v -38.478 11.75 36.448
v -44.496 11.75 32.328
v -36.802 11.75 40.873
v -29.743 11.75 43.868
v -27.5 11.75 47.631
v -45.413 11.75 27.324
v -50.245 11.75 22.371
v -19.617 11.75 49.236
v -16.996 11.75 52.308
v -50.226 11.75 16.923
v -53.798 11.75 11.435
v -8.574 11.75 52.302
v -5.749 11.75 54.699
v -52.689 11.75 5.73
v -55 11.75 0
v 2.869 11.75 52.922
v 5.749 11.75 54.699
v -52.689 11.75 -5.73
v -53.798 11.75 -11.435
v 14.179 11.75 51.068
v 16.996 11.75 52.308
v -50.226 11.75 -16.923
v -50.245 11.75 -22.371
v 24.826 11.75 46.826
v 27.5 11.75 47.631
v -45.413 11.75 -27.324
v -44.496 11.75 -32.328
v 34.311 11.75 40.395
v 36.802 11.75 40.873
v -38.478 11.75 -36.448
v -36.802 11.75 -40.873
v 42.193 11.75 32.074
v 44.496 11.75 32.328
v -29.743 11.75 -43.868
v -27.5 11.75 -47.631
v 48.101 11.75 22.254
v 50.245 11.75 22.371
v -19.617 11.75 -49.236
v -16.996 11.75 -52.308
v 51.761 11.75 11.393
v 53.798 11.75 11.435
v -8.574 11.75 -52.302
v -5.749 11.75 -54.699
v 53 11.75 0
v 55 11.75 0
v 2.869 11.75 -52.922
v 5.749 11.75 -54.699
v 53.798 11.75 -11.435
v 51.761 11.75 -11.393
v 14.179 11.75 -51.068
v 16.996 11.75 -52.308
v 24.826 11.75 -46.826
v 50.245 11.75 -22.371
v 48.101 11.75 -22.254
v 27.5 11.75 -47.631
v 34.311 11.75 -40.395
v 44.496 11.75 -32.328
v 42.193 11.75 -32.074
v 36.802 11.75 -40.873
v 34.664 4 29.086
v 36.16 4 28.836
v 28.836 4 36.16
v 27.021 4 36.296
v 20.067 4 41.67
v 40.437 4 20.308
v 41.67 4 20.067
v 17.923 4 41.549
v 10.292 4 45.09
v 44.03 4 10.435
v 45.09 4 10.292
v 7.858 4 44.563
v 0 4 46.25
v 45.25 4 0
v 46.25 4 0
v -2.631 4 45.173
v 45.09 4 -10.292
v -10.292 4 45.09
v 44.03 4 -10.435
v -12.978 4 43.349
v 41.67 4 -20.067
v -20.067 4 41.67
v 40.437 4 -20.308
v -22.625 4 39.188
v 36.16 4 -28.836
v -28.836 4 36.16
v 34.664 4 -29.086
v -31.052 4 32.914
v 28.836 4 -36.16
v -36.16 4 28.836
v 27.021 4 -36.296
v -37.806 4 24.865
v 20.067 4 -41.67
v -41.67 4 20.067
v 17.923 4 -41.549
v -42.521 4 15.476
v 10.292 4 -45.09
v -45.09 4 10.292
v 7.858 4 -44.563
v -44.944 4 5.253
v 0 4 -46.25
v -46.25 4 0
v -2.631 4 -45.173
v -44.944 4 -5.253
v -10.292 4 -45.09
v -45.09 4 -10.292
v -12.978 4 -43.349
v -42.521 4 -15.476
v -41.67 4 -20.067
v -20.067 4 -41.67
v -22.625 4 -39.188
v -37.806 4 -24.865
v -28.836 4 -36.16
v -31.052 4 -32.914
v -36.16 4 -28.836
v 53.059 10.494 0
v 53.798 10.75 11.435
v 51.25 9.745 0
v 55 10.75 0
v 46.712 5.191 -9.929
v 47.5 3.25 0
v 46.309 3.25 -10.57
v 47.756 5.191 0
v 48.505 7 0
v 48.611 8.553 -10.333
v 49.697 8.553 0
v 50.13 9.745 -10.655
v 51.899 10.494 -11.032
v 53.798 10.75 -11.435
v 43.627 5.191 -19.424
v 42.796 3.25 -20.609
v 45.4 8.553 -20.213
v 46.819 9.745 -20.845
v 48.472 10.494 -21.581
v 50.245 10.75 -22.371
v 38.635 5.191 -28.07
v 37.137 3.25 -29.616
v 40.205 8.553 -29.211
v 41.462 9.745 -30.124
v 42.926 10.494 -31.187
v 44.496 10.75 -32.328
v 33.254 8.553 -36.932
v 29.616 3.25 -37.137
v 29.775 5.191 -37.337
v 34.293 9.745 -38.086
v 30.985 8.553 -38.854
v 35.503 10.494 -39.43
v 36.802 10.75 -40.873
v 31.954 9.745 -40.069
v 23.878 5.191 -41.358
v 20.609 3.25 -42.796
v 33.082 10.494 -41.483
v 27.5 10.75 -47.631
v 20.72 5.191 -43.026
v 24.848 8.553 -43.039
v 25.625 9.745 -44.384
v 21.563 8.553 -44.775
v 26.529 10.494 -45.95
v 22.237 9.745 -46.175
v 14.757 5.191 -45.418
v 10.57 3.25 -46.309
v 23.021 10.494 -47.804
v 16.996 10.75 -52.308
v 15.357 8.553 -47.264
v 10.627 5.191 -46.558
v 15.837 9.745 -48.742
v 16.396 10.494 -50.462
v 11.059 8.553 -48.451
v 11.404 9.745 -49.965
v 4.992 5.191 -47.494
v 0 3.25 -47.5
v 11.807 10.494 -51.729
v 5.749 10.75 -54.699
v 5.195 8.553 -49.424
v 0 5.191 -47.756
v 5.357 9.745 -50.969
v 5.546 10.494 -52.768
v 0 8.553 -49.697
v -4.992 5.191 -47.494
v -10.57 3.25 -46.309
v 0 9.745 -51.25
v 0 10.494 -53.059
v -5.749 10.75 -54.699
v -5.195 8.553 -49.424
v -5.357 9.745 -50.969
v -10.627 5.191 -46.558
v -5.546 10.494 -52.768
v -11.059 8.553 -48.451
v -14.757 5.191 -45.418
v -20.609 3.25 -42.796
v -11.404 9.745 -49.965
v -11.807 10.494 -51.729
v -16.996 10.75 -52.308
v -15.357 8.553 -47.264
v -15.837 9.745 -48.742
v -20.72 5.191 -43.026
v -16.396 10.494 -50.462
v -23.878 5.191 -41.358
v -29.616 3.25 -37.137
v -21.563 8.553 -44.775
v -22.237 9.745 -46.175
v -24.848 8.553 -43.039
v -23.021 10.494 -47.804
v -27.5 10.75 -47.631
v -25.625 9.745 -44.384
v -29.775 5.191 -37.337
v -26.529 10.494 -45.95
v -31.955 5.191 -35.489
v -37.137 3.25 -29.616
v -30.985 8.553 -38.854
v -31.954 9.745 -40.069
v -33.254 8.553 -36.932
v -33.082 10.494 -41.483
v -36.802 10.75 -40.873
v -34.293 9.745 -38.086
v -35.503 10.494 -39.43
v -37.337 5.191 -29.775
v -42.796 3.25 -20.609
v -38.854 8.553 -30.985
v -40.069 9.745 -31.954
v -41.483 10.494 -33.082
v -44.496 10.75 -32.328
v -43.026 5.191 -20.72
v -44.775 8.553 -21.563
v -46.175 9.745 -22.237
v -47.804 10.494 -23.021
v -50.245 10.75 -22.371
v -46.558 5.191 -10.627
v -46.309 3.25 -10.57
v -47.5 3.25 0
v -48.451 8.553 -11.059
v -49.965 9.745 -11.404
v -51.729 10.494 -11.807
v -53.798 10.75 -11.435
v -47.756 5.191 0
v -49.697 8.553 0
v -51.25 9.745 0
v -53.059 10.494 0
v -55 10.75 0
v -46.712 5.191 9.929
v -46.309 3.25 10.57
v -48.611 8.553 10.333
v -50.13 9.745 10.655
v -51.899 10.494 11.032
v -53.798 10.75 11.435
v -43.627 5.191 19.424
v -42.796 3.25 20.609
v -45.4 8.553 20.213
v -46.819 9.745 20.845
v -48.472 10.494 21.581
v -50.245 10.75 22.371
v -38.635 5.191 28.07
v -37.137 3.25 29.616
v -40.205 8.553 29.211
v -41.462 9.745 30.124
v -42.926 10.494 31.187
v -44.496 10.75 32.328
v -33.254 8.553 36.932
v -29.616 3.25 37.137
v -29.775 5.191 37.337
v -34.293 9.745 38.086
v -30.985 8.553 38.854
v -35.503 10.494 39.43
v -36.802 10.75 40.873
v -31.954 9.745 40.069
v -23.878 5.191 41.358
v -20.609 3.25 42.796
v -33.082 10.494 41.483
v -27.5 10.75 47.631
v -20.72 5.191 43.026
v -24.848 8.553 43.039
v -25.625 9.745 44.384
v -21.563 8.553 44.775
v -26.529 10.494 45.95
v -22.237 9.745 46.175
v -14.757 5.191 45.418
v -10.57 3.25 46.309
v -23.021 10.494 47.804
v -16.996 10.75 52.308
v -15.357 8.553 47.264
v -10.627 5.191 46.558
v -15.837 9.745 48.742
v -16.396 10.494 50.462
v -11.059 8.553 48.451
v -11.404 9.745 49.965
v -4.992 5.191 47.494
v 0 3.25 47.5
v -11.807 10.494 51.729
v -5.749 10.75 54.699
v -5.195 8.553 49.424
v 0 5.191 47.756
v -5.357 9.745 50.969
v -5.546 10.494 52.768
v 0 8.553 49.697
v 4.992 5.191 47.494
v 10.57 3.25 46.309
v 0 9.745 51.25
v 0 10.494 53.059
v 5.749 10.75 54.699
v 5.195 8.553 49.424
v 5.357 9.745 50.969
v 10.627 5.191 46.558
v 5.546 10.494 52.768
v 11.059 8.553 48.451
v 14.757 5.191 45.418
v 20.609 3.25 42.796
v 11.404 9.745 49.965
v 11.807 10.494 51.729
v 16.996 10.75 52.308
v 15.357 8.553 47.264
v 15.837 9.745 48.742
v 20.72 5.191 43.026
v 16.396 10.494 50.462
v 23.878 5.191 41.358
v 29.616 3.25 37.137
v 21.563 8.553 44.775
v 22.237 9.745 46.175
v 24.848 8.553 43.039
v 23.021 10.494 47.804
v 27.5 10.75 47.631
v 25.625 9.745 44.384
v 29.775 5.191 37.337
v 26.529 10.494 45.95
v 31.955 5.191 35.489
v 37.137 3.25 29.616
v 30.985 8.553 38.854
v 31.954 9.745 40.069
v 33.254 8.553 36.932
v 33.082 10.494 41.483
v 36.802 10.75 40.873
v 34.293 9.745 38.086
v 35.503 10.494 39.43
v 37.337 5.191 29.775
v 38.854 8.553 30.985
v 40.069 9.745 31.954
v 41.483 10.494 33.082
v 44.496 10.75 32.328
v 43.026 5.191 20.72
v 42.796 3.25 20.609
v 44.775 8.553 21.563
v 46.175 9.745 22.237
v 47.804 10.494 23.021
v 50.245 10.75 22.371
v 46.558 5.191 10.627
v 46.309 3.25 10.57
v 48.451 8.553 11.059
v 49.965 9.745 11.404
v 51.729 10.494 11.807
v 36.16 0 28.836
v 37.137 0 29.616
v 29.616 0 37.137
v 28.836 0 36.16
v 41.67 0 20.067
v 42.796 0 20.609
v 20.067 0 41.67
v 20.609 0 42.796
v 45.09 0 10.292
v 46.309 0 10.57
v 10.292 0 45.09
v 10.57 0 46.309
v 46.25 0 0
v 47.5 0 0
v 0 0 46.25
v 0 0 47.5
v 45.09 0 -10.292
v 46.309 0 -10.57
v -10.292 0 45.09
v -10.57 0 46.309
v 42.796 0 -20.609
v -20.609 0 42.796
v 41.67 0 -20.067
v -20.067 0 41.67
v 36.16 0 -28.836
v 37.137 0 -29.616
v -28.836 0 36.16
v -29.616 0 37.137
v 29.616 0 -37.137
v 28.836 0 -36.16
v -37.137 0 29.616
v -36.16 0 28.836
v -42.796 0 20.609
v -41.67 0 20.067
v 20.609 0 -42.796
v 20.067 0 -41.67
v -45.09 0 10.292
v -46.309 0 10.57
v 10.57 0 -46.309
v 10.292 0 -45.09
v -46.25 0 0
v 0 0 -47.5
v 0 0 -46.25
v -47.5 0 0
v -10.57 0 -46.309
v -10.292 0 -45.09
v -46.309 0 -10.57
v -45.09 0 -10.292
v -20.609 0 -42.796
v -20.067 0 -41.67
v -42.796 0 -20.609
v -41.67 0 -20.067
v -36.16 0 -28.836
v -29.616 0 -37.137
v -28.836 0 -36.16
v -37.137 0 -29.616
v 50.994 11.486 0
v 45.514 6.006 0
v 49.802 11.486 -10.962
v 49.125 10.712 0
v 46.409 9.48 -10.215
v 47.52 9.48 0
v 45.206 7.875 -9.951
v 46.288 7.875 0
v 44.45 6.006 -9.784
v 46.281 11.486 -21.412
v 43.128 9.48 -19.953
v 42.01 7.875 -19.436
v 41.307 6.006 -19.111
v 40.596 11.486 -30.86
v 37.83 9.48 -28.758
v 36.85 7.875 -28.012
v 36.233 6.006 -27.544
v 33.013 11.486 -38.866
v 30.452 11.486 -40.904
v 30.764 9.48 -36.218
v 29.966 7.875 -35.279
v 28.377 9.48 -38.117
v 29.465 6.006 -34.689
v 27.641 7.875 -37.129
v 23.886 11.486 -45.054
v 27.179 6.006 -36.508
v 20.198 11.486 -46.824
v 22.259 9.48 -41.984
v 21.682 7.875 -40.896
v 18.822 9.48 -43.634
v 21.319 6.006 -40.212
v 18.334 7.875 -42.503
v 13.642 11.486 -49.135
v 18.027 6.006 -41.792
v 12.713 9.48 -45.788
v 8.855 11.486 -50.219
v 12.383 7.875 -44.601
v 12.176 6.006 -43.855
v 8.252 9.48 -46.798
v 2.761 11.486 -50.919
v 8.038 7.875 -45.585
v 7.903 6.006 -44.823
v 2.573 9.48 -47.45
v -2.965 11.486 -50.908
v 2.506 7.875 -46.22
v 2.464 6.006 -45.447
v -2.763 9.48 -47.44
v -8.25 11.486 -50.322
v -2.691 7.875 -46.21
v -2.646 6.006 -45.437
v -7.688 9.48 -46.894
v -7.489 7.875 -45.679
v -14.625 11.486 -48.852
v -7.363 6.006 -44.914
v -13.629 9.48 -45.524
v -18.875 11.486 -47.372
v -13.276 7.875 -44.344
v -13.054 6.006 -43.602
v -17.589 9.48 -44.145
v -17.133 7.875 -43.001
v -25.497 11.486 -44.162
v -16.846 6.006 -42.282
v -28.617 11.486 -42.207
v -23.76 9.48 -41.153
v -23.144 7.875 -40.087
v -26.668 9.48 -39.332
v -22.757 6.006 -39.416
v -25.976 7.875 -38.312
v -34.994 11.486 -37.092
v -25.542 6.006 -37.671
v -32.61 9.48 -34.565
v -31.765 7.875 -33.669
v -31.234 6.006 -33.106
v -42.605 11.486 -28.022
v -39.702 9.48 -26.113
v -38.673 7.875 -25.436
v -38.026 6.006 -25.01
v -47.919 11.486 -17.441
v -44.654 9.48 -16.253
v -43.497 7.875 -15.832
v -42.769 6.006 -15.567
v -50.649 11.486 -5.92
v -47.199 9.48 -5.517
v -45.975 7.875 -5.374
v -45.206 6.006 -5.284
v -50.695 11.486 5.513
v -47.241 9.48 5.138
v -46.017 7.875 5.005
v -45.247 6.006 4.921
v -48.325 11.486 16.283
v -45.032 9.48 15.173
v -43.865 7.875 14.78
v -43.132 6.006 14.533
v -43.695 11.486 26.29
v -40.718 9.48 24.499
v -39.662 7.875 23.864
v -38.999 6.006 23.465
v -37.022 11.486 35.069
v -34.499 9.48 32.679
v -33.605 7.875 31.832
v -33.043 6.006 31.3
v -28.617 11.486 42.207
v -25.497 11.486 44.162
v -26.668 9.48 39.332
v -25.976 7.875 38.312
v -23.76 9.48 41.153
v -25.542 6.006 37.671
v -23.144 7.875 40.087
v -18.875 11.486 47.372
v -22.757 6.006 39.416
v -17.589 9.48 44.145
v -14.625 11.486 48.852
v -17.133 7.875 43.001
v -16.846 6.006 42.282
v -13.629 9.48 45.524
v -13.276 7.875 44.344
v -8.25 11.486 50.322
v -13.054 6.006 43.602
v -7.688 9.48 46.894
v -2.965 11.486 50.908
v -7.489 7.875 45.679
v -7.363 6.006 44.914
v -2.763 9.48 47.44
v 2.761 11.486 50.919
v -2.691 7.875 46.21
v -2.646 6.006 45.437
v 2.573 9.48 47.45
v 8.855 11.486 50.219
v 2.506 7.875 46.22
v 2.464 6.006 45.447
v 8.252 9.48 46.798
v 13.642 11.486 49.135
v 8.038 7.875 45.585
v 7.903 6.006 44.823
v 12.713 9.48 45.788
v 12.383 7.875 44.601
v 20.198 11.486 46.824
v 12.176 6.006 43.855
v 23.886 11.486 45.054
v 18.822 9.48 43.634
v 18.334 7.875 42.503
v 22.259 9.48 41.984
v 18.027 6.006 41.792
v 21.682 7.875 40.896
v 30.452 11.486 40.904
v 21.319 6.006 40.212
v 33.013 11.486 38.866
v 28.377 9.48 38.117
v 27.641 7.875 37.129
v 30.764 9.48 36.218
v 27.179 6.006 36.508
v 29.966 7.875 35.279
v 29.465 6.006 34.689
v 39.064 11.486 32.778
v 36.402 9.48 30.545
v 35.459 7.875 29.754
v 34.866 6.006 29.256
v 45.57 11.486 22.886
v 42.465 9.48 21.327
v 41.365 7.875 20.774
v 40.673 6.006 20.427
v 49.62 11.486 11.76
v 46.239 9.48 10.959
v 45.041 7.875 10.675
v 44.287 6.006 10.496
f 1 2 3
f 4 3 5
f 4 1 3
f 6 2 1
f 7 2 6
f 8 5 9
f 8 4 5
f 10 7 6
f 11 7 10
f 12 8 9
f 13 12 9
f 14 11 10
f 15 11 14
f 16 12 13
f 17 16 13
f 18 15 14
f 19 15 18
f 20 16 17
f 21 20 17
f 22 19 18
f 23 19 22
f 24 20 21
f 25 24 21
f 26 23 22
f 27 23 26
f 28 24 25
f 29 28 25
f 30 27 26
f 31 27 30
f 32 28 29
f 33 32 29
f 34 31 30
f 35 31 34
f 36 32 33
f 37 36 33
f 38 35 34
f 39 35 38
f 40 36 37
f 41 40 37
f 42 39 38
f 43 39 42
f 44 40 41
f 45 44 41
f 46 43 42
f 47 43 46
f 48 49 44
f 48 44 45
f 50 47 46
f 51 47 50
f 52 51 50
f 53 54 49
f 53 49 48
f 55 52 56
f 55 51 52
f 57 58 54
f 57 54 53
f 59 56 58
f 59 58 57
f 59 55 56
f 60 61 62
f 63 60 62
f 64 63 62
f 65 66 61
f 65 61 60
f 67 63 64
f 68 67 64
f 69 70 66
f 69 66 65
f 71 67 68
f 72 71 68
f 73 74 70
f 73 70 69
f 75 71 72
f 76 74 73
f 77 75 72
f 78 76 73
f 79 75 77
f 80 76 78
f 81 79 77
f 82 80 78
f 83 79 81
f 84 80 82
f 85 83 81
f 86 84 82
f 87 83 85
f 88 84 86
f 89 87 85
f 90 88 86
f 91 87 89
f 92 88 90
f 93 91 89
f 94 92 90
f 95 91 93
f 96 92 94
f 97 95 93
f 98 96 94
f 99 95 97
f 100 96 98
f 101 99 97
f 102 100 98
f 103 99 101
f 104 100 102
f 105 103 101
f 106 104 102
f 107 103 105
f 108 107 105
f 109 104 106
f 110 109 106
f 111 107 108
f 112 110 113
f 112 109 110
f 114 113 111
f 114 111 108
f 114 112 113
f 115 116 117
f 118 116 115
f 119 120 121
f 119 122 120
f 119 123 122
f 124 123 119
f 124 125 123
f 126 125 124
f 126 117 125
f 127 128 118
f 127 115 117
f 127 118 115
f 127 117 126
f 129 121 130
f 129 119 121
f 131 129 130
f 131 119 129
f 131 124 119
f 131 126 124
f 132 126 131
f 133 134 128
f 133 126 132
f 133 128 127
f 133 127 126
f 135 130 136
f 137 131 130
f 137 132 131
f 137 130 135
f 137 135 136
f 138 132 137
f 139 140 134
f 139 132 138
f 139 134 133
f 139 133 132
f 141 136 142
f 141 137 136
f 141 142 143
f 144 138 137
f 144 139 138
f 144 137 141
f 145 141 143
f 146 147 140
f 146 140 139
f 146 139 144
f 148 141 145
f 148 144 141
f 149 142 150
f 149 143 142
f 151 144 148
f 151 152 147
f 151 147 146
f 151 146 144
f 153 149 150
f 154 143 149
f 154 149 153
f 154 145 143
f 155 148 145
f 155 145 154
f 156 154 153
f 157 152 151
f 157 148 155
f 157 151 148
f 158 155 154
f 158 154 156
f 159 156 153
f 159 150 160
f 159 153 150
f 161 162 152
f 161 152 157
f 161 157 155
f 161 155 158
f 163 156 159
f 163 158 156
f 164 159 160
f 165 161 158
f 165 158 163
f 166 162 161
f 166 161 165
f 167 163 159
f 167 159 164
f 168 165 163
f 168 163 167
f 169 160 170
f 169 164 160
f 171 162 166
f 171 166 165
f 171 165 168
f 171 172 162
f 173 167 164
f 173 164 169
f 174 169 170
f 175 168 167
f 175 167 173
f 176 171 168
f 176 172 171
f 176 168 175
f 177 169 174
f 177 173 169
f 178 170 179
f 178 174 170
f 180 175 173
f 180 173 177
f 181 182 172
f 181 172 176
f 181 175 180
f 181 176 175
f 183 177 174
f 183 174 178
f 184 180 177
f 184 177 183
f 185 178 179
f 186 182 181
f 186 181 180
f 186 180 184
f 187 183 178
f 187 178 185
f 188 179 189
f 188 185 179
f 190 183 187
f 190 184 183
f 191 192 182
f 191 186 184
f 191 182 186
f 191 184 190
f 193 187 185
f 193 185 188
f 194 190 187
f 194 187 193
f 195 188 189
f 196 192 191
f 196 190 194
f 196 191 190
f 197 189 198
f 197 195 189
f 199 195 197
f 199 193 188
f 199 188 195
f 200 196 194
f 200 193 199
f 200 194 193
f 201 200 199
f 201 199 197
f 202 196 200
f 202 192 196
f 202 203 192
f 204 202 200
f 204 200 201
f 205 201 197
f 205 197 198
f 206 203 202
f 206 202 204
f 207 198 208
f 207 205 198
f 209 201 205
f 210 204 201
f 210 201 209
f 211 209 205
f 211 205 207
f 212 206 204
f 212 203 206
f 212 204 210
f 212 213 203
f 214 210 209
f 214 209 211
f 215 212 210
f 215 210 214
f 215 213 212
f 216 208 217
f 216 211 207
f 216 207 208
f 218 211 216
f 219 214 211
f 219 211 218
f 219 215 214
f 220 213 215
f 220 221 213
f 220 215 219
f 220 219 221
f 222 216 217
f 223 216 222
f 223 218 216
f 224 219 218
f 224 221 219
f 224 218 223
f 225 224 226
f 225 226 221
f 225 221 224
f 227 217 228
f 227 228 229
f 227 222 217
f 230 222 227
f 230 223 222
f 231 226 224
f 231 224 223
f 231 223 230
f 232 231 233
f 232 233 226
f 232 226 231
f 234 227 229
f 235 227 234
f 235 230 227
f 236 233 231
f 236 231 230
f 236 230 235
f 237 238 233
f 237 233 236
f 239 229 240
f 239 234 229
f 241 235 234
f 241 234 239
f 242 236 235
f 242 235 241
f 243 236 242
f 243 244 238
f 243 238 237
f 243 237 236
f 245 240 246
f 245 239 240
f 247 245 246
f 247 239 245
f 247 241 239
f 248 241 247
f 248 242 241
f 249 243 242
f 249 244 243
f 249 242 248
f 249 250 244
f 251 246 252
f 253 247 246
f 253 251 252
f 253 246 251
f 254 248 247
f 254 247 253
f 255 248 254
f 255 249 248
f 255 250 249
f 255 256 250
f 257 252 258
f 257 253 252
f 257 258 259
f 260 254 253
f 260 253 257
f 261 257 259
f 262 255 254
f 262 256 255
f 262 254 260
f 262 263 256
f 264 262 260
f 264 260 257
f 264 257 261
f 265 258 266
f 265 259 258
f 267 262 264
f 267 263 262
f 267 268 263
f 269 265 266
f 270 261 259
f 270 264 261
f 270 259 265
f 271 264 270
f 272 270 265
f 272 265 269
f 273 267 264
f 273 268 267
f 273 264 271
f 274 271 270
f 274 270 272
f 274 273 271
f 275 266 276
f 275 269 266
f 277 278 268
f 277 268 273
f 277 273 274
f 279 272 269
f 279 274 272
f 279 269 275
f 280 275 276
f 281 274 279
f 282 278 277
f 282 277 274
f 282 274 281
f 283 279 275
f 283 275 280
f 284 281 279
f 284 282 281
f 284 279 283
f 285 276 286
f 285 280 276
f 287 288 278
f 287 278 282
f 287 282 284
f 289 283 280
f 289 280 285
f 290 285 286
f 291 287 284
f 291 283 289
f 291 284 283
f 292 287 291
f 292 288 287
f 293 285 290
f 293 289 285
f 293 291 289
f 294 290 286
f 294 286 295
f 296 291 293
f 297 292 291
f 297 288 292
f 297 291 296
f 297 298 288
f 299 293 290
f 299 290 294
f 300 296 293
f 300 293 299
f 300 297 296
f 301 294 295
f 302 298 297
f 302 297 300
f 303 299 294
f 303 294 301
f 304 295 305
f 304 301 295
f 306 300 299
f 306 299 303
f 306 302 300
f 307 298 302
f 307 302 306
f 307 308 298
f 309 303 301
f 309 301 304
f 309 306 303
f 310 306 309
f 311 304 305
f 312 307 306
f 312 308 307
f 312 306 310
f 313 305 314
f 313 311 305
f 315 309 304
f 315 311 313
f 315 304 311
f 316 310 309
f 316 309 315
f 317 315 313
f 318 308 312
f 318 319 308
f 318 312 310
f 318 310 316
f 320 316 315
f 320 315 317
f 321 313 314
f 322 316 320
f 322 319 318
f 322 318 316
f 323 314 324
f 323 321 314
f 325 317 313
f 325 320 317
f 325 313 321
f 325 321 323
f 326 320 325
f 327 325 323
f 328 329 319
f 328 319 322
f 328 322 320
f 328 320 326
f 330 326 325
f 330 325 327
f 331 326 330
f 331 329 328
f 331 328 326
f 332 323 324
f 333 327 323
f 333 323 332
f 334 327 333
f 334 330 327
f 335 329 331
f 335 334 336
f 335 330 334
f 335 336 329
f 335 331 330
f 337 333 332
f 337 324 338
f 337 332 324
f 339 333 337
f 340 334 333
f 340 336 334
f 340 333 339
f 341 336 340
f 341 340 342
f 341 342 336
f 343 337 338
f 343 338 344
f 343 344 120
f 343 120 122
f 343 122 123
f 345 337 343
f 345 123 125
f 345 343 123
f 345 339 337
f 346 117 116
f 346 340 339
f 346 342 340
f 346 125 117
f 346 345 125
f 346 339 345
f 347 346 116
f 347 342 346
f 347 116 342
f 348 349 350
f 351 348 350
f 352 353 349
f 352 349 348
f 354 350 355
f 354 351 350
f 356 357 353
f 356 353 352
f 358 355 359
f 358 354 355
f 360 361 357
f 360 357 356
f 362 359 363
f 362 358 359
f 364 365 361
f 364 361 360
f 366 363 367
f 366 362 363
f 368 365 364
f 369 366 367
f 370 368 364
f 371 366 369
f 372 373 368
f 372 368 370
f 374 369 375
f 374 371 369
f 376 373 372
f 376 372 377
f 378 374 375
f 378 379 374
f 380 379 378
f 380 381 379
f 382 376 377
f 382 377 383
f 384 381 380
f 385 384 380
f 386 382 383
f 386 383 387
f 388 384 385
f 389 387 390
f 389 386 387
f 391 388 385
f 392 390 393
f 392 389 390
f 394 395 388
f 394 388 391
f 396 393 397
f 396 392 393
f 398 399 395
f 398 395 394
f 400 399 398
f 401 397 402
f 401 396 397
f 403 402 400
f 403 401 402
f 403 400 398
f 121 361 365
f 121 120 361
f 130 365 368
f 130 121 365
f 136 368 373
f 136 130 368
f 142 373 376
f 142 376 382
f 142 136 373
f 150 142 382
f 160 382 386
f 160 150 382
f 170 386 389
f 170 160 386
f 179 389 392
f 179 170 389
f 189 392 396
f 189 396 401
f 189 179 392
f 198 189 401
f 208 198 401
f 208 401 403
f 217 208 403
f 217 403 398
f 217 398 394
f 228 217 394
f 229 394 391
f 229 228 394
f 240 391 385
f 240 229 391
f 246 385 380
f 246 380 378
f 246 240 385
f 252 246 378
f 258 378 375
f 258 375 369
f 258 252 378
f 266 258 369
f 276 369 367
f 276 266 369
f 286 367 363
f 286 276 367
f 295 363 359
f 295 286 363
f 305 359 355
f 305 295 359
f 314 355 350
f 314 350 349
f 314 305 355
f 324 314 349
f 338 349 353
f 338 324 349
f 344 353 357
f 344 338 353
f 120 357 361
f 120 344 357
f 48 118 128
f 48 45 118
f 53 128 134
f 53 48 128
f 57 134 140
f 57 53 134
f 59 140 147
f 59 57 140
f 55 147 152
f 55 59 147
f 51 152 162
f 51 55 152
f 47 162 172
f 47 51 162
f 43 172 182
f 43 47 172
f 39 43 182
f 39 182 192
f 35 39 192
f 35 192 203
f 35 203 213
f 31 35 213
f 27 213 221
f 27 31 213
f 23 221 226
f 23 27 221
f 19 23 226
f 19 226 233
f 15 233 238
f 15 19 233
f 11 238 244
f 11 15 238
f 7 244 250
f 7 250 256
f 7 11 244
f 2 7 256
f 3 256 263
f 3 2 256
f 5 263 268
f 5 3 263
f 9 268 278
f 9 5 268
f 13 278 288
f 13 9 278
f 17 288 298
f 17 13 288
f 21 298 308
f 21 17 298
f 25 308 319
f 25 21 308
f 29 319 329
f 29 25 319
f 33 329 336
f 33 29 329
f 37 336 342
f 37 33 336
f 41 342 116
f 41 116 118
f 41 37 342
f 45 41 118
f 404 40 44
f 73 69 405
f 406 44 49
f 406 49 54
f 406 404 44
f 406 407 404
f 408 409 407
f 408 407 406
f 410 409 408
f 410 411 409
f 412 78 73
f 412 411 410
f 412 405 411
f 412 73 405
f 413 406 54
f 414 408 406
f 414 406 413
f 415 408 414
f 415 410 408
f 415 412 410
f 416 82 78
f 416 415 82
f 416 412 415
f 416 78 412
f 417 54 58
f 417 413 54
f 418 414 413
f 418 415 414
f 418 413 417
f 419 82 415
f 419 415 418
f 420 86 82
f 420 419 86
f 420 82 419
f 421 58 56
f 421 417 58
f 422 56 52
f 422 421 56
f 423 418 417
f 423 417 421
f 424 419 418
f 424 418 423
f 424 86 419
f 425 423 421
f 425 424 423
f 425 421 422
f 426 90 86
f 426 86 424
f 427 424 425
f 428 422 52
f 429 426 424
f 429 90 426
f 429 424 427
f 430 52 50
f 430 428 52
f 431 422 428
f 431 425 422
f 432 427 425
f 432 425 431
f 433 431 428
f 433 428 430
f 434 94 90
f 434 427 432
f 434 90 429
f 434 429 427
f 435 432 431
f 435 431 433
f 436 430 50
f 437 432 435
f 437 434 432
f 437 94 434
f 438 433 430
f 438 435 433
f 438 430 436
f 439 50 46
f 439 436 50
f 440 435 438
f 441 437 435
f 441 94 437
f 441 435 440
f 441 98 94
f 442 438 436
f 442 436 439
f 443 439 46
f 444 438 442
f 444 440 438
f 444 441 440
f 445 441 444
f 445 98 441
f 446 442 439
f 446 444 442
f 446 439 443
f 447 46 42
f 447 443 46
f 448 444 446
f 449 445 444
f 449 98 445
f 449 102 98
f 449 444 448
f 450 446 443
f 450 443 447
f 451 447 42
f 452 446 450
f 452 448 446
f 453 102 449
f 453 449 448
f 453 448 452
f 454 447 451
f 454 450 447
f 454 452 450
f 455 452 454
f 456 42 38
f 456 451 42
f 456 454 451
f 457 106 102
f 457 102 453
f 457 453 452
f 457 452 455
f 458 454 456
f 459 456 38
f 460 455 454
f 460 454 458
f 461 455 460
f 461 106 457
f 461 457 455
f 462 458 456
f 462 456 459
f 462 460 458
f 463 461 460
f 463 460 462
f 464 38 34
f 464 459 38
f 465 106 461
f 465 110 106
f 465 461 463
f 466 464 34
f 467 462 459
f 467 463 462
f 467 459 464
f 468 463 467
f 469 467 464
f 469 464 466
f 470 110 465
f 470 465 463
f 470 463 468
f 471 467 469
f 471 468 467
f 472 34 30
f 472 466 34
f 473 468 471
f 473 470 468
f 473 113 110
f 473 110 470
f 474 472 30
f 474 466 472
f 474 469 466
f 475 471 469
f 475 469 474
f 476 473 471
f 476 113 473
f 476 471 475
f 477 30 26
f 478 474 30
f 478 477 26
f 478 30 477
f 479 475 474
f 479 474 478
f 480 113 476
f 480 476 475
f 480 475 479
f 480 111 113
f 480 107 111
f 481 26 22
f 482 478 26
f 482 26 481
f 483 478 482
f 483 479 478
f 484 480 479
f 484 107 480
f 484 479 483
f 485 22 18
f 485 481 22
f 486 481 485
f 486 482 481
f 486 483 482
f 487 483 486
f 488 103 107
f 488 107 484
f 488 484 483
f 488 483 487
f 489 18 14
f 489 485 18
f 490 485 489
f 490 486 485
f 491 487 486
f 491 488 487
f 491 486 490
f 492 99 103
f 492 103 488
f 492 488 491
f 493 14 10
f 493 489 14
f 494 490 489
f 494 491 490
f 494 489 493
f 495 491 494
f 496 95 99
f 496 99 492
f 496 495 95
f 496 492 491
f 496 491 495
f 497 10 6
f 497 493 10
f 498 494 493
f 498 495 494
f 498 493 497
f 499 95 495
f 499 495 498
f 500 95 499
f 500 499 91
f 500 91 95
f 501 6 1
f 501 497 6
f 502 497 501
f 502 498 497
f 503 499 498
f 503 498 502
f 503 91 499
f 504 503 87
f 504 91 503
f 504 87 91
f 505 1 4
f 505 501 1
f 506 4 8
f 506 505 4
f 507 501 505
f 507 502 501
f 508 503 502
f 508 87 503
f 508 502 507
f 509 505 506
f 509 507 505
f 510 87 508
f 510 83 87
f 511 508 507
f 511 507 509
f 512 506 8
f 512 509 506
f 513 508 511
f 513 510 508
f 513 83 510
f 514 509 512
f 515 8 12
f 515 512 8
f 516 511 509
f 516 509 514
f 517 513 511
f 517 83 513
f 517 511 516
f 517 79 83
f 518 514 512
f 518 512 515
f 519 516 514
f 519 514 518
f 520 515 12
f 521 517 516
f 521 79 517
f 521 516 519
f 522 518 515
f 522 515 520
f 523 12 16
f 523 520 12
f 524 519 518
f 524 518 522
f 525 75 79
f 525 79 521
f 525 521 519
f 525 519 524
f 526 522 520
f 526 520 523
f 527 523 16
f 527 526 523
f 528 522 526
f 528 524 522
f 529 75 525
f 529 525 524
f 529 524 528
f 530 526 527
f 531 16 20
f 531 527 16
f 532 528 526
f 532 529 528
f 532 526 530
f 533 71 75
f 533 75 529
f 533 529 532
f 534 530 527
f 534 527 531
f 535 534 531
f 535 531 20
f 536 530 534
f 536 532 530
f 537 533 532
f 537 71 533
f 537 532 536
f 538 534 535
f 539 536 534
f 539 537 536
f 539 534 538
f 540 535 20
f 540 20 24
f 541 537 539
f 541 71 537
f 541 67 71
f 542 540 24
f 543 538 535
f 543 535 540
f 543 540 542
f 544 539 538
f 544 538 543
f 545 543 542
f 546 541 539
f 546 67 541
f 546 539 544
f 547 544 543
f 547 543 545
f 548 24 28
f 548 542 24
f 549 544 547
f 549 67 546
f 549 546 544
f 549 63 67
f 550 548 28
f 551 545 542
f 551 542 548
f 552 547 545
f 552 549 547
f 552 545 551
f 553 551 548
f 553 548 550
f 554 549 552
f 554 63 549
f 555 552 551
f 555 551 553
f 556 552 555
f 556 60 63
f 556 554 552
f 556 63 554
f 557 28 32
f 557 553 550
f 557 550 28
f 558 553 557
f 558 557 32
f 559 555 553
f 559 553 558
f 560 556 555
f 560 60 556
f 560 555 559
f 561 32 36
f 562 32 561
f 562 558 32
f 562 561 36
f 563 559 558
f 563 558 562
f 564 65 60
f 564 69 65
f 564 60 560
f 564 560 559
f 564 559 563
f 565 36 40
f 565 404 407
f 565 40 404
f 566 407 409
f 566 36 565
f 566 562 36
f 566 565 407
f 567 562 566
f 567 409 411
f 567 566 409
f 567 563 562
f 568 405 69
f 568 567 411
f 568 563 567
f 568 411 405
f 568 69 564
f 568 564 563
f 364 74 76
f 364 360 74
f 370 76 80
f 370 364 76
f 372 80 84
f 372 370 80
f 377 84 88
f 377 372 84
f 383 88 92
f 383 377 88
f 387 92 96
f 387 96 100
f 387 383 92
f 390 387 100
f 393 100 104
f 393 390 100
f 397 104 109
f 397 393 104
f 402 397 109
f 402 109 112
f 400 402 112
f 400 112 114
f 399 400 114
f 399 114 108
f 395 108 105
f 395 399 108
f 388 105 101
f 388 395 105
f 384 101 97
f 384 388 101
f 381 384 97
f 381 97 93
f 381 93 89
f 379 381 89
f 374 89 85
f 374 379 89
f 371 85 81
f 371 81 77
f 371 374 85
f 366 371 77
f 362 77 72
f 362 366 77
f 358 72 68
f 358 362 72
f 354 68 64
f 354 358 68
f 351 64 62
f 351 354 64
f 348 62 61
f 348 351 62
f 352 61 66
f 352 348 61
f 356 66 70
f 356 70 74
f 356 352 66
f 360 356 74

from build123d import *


with BuildPart() as part:
    # Sketch1 → Revolve1 (revolve)
    with BuildSketch(Plane.XY):
        with BuildLine():
            Line((47.5, 0), (47.5, 3.25))
            ThreePointArc((47.5, 3.25), (49.696699141, 8.553300859), (55, 10.75))
            Line((55, 10.75), (55, 11.75))
            Line((55, 11.75), (53, 11.75))
            ThreePointArc((53, 11.75), (47.519922446, 9.480077554), (45.25, 4))
            Line((45.25, 4), (46.25, 4))
            Line((46.25, 4), (46.25, 0))
            Line((46.25, 0), (47.5, 0))
        make_face()
    revolve(axis=Axis((0, 0, 0), (0, 1, 0)))


solid = part.part
